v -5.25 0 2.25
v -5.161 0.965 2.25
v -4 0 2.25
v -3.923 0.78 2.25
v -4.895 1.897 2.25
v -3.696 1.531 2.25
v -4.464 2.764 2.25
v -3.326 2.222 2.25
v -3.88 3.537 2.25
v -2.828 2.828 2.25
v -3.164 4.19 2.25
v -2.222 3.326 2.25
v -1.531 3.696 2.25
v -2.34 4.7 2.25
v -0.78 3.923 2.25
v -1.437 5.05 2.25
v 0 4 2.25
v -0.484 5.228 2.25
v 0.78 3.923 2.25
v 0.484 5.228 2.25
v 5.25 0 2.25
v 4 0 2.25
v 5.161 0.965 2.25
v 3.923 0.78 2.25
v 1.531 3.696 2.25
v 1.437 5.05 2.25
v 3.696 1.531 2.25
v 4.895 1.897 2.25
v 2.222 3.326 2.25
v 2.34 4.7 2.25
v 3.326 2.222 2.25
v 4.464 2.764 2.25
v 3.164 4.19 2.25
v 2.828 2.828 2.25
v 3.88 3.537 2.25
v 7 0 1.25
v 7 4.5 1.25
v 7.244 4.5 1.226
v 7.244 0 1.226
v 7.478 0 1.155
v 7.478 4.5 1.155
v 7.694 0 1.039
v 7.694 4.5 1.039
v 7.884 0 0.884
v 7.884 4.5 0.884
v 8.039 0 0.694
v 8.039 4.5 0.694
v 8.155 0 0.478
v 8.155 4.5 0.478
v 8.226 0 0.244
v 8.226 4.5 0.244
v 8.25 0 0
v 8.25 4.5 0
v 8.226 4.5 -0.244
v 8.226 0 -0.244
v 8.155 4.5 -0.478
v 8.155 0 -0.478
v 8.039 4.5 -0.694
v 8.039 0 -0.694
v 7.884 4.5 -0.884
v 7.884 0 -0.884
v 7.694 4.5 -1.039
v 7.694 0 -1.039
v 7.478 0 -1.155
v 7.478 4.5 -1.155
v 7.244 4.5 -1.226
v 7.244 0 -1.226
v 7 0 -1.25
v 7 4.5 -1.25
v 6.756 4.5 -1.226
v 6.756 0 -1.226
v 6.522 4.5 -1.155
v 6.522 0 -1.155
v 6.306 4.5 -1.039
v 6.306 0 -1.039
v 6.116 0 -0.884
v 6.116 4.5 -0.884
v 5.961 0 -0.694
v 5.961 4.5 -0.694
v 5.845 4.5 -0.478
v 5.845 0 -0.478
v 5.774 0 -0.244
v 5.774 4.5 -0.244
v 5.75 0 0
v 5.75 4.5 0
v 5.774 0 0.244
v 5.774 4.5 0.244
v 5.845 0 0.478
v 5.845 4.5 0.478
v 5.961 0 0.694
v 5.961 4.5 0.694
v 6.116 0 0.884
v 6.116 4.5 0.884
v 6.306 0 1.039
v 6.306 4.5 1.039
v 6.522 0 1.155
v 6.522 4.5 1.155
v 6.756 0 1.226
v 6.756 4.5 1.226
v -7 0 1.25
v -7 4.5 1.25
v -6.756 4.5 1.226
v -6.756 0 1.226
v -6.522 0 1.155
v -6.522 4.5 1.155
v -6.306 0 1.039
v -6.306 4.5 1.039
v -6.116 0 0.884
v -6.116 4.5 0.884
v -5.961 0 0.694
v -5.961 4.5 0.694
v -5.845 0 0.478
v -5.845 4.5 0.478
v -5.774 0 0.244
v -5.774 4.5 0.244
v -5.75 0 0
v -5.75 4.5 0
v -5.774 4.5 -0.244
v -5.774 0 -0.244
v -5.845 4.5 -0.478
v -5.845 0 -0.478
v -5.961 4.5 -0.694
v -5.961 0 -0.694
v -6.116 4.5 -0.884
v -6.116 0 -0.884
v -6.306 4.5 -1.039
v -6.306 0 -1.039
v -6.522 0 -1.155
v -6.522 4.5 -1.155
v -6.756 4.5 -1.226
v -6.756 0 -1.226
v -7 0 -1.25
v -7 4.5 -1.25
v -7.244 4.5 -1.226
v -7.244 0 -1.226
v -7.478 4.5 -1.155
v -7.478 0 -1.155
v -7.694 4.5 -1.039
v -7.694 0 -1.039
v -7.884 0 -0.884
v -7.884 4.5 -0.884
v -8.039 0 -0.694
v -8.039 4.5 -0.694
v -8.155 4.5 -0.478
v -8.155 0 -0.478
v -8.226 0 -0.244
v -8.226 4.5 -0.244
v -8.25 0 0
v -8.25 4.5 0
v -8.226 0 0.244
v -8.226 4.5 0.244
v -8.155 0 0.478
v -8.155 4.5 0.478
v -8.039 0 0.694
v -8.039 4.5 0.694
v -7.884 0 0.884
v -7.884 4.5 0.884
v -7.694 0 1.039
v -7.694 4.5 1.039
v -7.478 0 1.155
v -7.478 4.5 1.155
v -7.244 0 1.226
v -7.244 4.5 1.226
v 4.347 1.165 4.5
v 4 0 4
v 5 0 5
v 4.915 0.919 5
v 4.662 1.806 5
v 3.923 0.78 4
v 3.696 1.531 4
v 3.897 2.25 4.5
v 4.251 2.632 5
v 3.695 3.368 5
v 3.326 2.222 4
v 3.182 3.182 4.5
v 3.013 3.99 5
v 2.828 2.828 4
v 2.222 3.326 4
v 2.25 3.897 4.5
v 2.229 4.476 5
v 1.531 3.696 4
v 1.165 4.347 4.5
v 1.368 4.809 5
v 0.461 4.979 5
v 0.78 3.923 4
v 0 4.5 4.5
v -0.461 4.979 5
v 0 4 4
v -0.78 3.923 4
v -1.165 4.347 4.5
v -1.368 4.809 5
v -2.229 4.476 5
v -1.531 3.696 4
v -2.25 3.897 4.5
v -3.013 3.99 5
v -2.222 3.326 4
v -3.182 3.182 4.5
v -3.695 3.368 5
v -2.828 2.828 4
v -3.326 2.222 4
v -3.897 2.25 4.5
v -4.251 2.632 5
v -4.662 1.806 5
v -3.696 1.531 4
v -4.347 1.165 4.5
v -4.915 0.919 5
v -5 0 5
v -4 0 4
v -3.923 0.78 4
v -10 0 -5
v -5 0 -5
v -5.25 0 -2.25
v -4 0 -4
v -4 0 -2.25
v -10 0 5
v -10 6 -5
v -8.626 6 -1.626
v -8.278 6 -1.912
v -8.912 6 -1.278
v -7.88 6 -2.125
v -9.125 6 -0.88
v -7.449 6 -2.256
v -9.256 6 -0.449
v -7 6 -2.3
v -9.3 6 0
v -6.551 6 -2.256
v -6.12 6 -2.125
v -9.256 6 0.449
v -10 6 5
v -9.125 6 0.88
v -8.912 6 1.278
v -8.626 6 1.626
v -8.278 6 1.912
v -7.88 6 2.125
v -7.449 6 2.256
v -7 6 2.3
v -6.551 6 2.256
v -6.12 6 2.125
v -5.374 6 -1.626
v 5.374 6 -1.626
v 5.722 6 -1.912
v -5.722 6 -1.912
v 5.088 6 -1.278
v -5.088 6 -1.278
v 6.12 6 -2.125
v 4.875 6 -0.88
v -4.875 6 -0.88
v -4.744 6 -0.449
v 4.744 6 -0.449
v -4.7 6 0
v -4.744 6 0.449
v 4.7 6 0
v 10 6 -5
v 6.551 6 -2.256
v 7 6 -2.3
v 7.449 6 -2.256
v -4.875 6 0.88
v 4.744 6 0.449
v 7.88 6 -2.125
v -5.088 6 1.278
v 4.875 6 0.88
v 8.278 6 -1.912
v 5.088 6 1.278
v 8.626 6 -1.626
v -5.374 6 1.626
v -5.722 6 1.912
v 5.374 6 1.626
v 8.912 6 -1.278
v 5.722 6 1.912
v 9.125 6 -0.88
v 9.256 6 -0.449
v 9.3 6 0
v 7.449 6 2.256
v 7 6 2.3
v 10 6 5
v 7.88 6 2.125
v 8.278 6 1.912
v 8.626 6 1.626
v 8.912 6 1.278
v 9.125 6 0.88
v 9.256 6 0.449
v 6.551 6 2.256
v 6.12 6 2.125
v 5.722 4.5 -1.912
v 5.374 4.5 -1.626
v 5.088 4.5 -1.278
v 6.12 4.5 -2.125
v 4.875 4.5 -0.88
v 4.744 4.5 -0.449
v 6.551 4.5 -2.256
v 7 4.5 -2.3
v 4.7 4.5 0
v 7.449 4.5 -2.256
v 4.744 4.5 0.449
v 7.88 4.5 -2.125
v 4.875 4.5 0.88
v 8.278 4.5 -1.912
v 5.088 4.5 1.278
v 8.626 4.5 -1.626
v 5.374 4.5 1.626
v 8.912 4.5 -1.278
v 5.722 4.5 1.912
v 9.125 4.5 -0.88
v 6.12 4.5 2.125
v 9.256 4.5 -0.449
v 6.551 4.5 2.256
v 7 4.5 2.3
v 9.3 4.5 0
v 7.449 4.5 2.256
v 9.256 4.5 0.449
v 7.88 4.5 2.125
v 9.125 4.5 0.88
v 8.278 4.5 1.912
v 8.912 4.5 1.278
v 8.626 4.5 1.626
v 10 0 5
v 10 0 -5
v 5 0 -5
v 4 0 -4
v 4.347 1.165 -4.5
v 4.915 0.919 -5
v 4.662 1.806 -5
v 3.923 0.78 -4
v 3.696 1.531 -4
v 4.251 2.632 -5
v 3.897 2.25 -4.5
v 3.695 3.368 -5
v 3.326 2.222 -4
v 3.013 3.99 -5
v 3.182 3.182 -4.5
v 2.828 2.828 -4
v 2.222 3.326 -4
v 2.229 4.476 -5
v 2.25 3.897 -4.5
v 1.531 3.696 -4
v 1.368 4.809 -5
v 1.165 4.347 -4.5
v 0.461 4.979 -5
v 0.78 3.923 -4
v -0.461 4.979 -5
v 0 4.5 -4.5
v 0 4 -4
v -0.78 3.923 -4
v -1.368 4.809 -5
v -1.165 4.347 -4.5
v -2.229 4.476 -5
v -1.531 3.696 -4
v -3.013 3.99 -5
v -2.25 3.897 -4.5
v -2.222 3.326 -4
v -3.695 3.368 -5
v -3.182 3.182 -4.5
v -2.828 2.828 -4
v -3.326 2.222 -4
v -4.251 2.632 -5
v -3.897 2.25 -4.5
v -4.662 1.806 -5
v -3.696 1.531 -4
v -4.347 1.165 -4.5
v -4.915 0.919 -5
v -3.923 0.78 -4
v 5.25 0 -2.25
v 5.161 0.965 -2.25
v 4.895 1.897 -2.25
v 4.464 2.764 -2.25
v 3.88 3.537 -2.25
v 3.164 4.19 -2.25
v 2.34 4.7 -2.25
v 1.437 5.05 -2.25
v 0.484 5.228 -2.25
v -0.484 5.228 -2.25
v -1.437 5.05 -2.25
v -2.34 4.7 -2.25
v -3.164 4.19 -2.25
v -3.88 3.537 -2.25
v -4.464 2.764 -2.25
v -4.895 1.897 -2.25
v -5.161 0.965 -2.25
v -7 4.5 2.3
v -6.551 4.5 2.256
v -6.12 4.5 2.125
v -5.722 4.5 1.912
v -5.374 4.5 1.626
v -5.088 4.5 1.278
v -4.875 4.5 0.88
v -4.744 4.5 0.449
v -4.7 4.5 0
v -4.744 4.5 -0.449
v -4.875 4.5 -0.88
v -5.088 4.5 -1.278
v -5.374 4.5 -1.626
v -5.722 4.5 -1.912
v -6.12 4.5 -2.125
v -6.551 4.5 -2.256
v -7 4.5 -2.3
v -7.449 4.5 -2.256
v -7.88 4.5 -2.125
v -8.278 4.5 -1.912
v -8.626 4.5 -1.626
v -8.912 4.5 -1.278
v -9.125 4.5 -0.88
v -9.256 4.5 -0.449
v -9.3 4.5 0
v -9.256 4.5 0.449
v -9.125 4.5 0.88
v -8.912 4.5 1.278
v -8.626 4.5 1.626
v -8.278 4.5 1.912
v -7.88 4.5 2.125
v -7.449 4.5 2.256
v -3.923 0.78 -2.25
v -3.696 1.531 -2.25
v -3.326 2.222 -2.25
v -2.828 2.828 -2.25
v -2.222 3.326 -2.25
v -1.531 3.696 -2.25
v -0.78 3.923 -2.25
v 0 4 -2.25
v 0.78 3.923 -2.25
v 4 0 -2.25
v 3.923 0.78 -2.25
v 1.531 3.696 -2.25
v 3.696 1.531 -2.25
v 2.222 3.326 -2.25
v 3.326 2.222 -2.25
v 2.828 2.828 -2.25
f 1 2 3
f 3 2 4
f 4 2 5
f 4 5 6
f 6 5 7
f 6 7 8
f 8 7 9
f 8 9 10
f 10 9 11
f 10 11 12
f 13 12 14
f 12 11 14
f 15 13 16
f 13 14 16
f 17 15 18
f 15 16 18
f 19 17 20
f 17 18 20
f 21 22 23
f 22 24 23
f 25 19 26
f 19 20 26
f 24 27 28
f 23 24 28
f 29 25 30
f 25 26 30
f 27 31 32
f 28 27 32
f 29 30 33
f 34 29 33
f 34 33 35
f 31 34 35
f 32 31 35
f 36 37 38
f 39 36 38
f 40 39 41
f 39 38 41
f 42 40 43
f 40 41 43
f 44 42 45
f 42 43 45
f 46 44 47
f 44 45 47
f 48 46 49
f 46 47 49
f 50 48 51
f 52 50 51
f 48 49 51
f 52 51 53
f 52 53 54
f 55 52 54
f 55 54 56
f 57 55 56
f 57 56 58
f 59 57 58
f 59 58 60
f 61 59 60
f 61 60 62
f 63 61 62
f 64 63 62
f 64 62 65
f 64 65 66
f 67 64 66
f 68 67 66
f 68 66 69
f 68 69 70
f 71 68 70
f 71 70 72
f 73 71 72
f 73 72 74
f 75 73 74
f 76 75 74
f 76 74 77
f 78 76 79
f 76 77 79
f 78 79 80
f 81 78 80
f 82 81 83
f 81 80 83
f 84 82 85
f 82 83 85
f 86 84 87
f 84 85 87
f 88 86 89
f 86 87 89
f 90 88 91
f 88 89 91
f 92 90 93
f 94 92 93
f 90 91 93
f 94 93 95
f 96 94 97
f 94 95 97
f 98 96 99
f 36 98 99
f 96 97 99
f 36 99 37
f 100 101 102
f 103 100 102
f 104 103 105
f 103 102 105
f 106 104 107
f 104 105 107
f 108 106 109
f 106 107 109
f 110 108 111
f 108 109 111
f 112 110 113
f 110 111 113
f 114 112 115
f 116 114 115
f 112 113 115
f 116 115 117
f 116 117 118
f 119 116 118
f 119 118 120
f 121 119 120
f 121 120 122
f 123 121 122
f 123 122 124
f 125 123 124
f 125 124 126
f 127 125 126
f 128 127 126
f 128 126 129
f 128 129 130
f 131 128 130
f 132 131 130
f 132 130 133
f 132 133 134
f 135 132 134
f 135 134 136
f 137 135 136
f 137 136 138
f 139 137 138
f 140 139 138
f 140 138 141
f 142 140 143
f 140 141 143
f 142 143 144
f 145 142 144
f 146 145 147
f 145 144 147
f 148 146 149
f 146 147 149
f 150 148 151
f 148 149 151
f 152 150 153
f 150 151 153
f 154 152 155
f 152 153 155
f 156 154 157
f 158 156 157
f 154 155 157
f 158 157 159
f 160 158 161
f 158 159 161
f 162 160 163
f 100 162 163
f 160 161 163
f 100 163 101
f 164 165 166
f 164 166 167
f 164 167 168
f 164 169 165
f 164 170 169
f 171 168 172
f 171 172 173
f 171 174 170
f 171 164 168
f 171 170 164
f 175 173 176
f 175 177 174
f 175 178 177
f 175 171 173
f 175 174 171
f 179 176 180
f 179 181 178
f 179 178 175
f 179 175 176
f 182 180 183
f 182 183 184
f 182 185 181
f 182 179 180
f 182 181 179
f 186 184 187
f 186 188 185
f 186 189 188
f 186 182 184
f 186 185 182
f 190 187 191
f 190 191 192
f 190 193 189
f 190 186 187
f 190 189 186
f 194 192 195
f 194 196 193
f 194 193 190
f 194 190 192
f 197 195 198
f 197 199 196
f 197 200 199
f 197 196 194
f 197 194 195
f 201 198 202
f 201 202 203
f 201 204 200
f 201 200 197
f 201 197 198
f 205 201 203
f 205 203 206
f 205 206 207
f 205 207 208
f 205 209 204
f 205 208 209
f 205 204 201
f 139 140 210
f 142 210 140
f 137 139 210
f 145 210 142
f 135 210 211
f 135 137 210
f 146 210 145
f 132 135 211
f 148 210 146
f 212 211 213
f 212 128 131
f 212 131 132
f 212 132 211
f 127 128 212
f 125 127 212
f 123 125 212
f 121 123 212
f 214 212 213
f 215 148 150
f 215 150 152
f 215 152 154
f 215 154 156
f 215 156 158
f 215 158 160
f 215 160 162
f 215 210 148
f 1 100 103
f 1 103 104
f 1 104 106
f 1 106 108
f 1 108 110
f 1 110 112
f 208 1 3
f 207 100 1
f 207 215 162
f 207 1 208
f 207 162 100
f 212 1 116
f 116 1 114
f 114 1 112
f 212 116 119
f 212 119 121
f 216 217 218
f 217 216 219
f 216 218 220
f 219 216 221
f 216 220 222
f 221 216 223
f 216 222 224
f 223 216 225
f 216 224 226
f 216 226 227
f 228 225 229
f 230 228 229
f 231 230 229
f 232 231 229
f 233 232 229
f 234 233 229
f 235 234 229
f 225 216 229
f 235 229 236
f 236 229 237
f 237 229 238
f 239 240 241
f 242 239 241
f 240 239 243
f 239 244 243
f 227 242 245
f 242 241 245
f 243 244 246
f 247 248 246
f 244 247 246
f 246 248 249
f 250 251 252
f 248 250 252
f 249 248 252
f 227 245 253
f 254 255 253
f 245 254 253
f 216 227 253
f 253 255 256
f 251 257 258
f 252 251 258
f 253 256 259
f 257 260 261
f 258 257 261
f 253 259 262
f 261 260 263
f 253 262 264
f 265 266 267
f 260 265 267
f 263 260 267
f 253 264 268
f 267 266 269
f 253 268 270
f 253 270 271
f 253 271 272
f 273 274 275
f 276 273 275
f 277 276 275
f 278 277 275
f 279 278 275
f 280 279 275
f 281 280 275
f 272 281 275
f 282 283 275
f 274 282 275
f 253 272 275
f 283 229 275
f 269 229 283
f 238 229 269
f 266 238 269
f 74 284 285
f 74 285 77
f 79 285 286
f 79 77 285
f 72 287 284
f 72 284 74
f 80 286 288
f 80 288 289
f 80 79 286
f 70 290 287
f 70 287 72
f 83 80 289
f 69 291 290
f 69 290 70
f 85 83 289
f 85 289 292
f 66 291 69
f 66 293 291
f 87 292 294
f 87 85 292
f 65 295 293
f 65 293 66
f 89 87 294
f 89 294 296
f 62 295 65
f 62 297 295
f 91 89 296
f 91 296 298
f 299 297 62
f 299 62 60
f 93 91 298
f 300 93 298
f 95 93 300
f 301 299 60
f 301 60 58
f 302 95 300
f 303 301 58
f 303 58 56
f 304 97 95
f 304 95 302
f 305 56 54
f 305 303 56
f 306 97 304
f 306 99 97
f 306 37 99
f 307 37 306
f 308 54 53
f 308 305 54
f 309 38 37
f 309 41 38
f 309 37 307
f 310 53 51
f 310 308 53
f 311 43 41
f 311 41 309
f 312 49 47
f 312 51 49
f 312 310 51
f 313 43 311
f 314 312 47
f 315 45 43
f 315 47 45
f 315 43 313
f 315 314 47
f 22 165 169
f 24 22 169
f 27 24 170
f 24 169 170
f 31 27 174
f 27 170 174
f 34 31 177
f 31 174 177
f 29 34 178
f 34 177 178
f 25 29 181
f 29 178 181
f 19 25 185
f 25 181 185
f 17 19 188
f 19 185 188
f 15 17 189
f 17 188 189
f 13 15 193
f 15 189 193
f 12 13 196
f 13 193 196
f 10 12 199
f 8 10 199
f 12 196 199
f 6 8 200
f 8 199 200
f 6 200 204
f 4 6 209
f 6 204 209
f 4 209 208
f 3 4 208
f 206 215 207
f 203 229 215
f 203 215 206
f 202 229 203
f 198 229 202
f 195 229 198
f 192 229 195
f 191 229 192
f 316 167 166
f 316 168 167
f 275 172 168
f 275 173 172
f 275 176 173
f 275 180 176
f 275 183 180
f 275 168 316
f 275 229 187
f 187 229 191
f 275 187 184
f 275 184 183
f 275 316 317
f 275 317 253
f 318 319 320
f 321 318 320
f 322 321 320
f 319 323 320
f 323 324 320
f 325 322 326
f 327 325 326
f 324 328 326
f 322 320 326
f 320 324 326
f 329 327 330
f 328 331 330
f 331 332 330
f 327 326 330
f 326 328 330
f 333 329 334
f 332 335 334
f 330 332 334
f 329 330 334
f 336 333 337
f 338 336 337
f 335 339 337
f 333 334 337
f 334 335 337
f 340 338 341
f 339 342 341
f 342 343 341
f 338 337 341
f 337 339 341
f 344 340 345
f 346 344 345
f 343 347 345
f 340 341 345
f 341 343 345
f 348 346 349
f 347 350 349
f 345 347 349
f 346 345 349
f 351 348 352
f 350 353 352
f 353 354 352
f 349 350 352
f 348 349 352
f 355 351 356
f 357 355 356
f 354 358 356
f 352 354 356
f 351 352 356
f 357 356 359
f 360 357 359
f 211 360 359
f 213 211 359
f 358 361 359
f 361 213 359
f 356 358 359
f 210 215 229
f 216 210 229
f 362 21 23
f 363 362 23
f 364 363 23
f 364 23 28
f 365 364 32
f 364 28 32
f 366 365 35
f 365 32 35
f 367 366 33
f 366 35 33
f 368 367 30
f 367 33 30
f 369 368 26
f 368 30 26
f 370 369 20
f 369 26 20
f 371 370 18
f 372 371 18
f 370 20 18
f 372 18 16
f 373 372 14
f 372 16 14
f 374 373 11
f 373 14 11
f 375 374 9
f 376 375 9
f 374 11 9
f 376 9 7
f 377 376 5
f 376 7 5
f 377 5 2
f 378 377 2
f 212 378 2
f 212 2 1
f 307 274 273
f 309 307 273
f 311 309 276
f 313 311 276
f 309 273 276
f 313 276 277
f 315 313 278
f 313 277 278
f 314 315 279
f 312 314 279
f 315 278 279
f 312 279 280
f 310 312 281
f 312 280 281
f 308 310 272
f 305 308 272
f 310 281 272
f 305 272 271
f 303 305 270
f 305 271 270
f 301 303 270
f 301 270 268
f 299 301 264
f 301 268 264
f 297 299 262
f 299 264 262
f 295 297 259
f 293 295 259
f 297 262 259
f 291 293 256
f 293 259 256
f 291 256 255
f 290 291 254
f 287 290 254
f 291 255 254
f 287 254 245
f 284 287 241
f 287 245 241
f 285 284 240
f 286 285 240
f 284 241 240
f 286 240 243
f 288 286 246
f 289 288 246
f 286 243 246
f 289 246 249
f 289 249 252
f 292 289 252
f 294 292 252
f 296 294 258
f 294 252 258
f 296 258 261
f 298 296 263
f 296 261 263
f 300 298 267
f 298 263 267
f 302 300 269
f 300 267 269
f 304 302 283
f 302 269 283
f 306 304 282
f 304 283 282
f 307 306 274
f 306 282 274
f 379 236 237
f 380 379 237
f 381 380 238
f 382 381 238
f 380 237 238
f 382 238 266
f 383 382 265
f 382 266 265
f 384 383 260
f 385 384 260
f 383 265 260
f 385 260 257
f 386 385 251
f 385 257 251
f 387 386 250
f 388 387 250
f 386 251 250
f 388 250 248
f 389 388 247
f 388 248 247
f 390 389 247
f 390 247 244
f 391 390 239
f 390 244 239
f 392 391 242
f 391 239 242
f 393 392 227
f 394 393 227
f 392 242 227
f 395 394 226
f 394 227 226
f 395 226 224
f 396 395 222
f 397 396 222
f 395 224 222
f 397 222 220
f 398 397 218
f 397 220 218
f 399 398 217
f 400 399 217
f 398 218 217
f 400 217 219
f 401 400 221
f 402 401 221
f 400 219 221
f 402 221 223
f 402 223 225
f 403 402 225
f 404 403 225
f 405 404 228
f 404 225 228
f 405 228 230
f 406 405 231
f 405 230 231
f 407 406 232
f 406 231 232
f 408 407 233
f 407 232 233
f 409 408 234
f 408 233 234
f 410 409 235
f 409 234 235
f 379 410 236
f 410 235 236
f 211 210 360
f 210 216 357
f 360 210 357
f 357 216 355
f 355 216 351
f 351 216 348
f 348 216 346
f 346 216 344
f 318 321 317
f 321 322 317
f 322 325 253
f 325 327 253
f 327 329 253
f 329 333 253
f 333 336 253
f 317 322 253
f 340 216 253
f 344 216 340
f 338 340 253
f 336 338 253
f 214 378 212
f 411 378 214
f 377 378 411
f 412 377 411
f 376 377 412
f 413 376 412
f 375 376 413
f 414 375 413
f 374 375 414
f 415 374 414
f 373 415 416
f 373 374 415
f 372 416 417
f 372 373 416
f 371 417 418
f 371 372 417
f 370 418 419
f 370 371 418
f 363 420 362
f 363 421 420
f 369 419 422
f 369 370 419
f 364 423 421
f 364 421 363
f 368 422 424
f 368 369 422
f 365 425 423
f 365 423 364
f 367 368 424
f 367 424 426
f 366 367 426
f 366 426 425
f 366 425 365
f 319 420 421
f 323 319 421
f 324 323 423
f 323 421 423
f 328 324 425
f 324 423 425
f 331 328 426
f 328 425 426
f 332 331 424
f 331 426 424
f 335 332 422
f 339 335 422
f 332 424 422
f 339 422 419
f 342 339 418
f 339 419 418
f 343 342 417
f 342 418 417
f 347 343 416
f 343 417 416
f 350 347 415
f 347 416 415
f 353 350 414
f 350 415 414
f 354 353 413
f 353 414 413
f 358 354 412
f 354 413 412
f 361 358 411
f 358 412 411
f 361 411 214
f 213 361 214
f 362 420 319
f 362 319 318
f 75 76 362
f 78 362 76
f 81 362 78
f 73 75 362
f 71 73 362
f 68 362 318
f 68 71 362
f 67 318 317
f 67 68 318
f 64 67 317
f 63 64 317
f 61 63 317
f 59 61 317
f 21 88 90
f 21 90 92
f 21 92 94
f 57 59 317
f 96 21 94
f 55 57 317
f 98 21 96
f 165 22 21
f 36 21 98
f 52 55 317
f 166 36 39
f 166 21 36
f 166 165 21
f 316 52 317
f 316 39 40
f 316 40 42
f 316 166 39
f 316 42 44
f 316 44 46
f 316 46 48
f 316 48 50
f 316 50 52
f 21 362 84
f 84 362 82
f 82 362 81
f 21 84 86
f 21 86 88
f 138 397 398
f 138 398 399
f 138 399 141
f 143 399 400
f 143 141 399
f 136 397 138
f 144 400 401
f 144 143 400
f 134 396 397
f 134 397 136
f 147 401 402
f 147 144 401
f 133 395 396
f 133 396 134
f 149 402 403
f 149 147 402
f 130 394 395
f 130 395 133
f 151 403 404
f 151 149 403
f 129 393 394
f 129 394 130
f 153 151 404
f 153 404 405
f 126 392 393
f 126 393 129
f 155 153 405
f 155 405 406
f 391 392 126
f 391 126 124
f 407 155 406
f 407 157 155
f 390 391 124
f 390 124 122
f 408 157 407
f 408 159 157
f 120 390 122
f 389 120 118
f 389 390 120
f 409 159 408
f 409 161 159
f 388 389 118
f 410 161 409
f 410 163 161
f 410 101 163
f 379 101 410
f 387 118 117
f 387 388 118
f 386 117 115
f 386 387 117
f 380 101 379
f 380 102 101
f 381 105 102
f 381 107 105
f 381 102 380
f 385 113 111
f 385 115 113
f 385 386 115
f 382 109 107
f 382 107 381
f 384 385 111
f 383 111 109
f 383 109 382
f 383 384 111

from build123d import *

# Parameters (mm, degrees)
SKETCH_2_W             = 20
SKETCH_2_H             = 6
EXTRUDE_379_DEPTH      = 5
SKETCH_3_R             = 4
CUT_EXTRUDE_526_DEPTH  = 16.362291496
SKETCH_4_R             = 5.25
CUT_EXTRUDE_602_DEPTH  = 2.25
SKETCH_5_R             = 1.25
CUT_EXTRUDE_755_DEPTH  = 13.68857754
CHAMFER_2_SIZE         = 1
SKETCH_6_R             = 2.3
CUT_EXTRUDE_1018_DEPTH = 1.5


with BuildPart() as part:
    # Эскиз2 → Extrude 379 (new, symmetric)
    with BuildSketch(Plane.XY):
        with Locations((0, 3)):
            Rectangle(SKETCH_2_W, SKETCH_2_H)
    extrude(amount=EXTRUDE_379_DEPTH, both=True)

    # Эскиз3 → Cut-Extrude 526 (cut, through all)
    with BuildSketch(Plane.XY.offset(5)):
        Circle(SKETCH_3_R)
    extrude(amount=-CUT_EXTRUDE_526_DEPTH, mode=Mode.SUBTRACT)

    # Эскиз4 → Cut-Extrude 602 (cut, symmetric)
    with BuildSketch(Plane.XY):
        Circle(SKETCH_4_R)
    extrude(amount=CUT_EXTRUDE_602_DEPTH, both=True, mode=Mode.SUBTRACT)

    # Эскиз5 → Cut-Extrude 755 (cut, through all)
    with BuildSketch(Plane(origin=(0, 6, 0), x_dir=(1, 0, 0), z_dir=(0, 1, 0))):
        with Locations(Location((-7, 0, 0), (0, 0, 270))):
            Circle(SKETCH_5_R)
        with Locations(Location((7, 0, 0), (0, 0, 270))):
            Circle(SKETCH_5_R)
    extrude(amount=-CUT_EXTRUDE_755_DEPTH, mode=Mode.SUBTRACT)

    # Фаска2
    chamfer_2_edges = [part.edges().sort_by_distance(p)[0] for p in [
        (0, 4, 5),
        (0, 4, -5),
    ]]
    chamfer(chamfer_2_edges, length=CHAMFER_2_SIZE)

    # Эскиз6 → Cut-Extrude 1018 (cut)
    with BuildSketch(Plane(origin=(0, 6, 0), x_dir=(1, 0, 0), z_dir=(0, 1, 0))):
        with Locations(Location((-7, 0, 0), (0, 0, 270))):
            Circle(SKETCH_6_R)
        with Locations(Location((7, 0, 0), (0, 0, 270))):
            Circle(SKETCH_6_R)
    extrude(amount=-CUT_EXTRUDE_1018_DEPTH, mode=Mode.SUBTRACT)


solid = part.part
